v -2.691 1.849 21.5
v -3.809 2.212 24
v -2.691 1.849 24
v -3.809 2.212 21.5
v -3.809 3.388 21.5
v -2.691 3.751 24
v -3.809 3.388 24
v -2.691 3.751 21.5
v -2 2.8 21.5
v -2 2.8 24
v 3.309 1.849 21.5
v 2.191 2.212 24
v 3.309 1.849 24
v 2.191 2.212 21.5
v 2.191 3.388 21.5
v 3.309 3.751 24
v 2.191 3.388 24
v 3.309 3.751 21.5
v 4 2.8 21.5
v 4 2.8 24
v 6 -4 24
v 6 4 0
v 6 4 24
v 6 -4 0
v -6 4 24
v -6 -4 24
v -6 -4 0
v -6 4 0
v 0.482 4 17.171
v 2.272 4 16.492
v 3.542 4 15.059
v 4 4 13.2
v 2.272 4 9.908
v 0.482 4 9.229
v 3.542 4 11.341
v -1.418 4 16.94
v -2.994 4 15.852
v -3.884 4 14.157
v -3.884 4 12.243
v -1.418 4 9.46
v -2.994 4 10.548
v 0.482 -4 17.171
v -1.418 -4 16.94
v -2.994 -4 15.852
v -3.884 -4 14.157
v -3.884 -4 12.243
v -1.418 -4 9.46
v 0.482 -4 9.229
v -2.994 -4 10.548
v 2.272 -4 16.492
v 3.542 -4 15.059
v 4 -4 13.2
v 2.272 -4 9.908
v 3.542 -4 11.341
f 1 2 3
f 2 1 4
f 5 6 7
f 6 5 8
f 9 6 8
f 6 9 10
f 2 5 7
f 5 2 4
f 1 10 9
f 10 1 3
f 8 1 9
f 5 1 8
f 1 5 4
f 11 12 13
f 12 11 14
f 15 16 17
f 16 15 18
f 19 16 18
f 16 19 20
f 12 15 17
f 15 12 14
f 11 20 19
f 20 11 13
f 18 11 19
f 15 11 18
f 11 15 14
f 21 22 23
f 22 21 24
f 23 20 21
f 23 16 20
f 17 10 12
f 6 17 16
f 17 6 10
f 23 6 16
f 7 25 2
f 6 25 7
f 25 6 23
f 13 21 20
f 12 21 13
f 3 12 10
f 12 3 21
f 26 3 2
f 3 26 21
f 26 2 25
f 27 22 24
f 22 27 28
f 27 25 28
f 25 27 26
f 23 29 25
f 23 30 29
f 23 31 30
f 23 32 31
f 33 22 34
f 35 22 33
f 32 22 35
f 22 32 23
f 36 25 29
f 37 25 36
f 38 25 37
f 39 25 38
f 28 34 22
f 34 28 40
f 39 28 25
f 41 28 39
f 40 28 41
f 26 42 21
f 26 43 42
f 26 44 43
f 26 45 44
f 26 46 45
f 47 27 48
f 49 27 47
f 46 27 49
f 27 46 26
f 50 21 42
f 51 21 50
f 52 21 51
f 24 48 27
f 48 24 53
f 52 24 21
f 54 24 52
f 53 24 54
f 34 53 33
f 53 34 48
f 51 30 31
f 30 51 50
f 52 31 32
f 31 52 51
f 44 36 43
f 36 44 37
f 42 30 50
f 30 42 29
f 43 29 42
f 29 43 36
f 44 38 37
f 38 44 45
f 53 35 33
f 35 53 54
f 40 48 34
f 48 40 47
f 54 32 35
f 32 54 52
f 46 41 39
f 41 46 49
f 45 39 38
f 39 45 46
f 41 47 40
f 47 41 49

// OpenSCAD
// part_id: a4
// name: A4 block
// source_drawing_ids: DRW-001
// units: mm
// revision: 0.1-placeholder
// SPDX-License-Identifier: MIT

module part_a4(w = 12, d = 8, h = 24, bore_d = 8) {
    difference() {
        translate([-w / 2, -d / 2, 0]) cube([w, d, h], center = false);
        translate([0, 0, h * 0.55]) rotate([90, 0, 0]) cylinder(d = bore_d, h = d + 0.2, center = true);
        for (x = [-3, 3]) translate([x, d / 2 - 1.2, h - 2.5]) cylinder(d = 2.0, h = 2.6, center = false);
    }
}


// ---- "main guard" ----
// Default to previewing when opened directly:
if (is_undef(__LIB_MODE__)) {
    part_a4();
}
